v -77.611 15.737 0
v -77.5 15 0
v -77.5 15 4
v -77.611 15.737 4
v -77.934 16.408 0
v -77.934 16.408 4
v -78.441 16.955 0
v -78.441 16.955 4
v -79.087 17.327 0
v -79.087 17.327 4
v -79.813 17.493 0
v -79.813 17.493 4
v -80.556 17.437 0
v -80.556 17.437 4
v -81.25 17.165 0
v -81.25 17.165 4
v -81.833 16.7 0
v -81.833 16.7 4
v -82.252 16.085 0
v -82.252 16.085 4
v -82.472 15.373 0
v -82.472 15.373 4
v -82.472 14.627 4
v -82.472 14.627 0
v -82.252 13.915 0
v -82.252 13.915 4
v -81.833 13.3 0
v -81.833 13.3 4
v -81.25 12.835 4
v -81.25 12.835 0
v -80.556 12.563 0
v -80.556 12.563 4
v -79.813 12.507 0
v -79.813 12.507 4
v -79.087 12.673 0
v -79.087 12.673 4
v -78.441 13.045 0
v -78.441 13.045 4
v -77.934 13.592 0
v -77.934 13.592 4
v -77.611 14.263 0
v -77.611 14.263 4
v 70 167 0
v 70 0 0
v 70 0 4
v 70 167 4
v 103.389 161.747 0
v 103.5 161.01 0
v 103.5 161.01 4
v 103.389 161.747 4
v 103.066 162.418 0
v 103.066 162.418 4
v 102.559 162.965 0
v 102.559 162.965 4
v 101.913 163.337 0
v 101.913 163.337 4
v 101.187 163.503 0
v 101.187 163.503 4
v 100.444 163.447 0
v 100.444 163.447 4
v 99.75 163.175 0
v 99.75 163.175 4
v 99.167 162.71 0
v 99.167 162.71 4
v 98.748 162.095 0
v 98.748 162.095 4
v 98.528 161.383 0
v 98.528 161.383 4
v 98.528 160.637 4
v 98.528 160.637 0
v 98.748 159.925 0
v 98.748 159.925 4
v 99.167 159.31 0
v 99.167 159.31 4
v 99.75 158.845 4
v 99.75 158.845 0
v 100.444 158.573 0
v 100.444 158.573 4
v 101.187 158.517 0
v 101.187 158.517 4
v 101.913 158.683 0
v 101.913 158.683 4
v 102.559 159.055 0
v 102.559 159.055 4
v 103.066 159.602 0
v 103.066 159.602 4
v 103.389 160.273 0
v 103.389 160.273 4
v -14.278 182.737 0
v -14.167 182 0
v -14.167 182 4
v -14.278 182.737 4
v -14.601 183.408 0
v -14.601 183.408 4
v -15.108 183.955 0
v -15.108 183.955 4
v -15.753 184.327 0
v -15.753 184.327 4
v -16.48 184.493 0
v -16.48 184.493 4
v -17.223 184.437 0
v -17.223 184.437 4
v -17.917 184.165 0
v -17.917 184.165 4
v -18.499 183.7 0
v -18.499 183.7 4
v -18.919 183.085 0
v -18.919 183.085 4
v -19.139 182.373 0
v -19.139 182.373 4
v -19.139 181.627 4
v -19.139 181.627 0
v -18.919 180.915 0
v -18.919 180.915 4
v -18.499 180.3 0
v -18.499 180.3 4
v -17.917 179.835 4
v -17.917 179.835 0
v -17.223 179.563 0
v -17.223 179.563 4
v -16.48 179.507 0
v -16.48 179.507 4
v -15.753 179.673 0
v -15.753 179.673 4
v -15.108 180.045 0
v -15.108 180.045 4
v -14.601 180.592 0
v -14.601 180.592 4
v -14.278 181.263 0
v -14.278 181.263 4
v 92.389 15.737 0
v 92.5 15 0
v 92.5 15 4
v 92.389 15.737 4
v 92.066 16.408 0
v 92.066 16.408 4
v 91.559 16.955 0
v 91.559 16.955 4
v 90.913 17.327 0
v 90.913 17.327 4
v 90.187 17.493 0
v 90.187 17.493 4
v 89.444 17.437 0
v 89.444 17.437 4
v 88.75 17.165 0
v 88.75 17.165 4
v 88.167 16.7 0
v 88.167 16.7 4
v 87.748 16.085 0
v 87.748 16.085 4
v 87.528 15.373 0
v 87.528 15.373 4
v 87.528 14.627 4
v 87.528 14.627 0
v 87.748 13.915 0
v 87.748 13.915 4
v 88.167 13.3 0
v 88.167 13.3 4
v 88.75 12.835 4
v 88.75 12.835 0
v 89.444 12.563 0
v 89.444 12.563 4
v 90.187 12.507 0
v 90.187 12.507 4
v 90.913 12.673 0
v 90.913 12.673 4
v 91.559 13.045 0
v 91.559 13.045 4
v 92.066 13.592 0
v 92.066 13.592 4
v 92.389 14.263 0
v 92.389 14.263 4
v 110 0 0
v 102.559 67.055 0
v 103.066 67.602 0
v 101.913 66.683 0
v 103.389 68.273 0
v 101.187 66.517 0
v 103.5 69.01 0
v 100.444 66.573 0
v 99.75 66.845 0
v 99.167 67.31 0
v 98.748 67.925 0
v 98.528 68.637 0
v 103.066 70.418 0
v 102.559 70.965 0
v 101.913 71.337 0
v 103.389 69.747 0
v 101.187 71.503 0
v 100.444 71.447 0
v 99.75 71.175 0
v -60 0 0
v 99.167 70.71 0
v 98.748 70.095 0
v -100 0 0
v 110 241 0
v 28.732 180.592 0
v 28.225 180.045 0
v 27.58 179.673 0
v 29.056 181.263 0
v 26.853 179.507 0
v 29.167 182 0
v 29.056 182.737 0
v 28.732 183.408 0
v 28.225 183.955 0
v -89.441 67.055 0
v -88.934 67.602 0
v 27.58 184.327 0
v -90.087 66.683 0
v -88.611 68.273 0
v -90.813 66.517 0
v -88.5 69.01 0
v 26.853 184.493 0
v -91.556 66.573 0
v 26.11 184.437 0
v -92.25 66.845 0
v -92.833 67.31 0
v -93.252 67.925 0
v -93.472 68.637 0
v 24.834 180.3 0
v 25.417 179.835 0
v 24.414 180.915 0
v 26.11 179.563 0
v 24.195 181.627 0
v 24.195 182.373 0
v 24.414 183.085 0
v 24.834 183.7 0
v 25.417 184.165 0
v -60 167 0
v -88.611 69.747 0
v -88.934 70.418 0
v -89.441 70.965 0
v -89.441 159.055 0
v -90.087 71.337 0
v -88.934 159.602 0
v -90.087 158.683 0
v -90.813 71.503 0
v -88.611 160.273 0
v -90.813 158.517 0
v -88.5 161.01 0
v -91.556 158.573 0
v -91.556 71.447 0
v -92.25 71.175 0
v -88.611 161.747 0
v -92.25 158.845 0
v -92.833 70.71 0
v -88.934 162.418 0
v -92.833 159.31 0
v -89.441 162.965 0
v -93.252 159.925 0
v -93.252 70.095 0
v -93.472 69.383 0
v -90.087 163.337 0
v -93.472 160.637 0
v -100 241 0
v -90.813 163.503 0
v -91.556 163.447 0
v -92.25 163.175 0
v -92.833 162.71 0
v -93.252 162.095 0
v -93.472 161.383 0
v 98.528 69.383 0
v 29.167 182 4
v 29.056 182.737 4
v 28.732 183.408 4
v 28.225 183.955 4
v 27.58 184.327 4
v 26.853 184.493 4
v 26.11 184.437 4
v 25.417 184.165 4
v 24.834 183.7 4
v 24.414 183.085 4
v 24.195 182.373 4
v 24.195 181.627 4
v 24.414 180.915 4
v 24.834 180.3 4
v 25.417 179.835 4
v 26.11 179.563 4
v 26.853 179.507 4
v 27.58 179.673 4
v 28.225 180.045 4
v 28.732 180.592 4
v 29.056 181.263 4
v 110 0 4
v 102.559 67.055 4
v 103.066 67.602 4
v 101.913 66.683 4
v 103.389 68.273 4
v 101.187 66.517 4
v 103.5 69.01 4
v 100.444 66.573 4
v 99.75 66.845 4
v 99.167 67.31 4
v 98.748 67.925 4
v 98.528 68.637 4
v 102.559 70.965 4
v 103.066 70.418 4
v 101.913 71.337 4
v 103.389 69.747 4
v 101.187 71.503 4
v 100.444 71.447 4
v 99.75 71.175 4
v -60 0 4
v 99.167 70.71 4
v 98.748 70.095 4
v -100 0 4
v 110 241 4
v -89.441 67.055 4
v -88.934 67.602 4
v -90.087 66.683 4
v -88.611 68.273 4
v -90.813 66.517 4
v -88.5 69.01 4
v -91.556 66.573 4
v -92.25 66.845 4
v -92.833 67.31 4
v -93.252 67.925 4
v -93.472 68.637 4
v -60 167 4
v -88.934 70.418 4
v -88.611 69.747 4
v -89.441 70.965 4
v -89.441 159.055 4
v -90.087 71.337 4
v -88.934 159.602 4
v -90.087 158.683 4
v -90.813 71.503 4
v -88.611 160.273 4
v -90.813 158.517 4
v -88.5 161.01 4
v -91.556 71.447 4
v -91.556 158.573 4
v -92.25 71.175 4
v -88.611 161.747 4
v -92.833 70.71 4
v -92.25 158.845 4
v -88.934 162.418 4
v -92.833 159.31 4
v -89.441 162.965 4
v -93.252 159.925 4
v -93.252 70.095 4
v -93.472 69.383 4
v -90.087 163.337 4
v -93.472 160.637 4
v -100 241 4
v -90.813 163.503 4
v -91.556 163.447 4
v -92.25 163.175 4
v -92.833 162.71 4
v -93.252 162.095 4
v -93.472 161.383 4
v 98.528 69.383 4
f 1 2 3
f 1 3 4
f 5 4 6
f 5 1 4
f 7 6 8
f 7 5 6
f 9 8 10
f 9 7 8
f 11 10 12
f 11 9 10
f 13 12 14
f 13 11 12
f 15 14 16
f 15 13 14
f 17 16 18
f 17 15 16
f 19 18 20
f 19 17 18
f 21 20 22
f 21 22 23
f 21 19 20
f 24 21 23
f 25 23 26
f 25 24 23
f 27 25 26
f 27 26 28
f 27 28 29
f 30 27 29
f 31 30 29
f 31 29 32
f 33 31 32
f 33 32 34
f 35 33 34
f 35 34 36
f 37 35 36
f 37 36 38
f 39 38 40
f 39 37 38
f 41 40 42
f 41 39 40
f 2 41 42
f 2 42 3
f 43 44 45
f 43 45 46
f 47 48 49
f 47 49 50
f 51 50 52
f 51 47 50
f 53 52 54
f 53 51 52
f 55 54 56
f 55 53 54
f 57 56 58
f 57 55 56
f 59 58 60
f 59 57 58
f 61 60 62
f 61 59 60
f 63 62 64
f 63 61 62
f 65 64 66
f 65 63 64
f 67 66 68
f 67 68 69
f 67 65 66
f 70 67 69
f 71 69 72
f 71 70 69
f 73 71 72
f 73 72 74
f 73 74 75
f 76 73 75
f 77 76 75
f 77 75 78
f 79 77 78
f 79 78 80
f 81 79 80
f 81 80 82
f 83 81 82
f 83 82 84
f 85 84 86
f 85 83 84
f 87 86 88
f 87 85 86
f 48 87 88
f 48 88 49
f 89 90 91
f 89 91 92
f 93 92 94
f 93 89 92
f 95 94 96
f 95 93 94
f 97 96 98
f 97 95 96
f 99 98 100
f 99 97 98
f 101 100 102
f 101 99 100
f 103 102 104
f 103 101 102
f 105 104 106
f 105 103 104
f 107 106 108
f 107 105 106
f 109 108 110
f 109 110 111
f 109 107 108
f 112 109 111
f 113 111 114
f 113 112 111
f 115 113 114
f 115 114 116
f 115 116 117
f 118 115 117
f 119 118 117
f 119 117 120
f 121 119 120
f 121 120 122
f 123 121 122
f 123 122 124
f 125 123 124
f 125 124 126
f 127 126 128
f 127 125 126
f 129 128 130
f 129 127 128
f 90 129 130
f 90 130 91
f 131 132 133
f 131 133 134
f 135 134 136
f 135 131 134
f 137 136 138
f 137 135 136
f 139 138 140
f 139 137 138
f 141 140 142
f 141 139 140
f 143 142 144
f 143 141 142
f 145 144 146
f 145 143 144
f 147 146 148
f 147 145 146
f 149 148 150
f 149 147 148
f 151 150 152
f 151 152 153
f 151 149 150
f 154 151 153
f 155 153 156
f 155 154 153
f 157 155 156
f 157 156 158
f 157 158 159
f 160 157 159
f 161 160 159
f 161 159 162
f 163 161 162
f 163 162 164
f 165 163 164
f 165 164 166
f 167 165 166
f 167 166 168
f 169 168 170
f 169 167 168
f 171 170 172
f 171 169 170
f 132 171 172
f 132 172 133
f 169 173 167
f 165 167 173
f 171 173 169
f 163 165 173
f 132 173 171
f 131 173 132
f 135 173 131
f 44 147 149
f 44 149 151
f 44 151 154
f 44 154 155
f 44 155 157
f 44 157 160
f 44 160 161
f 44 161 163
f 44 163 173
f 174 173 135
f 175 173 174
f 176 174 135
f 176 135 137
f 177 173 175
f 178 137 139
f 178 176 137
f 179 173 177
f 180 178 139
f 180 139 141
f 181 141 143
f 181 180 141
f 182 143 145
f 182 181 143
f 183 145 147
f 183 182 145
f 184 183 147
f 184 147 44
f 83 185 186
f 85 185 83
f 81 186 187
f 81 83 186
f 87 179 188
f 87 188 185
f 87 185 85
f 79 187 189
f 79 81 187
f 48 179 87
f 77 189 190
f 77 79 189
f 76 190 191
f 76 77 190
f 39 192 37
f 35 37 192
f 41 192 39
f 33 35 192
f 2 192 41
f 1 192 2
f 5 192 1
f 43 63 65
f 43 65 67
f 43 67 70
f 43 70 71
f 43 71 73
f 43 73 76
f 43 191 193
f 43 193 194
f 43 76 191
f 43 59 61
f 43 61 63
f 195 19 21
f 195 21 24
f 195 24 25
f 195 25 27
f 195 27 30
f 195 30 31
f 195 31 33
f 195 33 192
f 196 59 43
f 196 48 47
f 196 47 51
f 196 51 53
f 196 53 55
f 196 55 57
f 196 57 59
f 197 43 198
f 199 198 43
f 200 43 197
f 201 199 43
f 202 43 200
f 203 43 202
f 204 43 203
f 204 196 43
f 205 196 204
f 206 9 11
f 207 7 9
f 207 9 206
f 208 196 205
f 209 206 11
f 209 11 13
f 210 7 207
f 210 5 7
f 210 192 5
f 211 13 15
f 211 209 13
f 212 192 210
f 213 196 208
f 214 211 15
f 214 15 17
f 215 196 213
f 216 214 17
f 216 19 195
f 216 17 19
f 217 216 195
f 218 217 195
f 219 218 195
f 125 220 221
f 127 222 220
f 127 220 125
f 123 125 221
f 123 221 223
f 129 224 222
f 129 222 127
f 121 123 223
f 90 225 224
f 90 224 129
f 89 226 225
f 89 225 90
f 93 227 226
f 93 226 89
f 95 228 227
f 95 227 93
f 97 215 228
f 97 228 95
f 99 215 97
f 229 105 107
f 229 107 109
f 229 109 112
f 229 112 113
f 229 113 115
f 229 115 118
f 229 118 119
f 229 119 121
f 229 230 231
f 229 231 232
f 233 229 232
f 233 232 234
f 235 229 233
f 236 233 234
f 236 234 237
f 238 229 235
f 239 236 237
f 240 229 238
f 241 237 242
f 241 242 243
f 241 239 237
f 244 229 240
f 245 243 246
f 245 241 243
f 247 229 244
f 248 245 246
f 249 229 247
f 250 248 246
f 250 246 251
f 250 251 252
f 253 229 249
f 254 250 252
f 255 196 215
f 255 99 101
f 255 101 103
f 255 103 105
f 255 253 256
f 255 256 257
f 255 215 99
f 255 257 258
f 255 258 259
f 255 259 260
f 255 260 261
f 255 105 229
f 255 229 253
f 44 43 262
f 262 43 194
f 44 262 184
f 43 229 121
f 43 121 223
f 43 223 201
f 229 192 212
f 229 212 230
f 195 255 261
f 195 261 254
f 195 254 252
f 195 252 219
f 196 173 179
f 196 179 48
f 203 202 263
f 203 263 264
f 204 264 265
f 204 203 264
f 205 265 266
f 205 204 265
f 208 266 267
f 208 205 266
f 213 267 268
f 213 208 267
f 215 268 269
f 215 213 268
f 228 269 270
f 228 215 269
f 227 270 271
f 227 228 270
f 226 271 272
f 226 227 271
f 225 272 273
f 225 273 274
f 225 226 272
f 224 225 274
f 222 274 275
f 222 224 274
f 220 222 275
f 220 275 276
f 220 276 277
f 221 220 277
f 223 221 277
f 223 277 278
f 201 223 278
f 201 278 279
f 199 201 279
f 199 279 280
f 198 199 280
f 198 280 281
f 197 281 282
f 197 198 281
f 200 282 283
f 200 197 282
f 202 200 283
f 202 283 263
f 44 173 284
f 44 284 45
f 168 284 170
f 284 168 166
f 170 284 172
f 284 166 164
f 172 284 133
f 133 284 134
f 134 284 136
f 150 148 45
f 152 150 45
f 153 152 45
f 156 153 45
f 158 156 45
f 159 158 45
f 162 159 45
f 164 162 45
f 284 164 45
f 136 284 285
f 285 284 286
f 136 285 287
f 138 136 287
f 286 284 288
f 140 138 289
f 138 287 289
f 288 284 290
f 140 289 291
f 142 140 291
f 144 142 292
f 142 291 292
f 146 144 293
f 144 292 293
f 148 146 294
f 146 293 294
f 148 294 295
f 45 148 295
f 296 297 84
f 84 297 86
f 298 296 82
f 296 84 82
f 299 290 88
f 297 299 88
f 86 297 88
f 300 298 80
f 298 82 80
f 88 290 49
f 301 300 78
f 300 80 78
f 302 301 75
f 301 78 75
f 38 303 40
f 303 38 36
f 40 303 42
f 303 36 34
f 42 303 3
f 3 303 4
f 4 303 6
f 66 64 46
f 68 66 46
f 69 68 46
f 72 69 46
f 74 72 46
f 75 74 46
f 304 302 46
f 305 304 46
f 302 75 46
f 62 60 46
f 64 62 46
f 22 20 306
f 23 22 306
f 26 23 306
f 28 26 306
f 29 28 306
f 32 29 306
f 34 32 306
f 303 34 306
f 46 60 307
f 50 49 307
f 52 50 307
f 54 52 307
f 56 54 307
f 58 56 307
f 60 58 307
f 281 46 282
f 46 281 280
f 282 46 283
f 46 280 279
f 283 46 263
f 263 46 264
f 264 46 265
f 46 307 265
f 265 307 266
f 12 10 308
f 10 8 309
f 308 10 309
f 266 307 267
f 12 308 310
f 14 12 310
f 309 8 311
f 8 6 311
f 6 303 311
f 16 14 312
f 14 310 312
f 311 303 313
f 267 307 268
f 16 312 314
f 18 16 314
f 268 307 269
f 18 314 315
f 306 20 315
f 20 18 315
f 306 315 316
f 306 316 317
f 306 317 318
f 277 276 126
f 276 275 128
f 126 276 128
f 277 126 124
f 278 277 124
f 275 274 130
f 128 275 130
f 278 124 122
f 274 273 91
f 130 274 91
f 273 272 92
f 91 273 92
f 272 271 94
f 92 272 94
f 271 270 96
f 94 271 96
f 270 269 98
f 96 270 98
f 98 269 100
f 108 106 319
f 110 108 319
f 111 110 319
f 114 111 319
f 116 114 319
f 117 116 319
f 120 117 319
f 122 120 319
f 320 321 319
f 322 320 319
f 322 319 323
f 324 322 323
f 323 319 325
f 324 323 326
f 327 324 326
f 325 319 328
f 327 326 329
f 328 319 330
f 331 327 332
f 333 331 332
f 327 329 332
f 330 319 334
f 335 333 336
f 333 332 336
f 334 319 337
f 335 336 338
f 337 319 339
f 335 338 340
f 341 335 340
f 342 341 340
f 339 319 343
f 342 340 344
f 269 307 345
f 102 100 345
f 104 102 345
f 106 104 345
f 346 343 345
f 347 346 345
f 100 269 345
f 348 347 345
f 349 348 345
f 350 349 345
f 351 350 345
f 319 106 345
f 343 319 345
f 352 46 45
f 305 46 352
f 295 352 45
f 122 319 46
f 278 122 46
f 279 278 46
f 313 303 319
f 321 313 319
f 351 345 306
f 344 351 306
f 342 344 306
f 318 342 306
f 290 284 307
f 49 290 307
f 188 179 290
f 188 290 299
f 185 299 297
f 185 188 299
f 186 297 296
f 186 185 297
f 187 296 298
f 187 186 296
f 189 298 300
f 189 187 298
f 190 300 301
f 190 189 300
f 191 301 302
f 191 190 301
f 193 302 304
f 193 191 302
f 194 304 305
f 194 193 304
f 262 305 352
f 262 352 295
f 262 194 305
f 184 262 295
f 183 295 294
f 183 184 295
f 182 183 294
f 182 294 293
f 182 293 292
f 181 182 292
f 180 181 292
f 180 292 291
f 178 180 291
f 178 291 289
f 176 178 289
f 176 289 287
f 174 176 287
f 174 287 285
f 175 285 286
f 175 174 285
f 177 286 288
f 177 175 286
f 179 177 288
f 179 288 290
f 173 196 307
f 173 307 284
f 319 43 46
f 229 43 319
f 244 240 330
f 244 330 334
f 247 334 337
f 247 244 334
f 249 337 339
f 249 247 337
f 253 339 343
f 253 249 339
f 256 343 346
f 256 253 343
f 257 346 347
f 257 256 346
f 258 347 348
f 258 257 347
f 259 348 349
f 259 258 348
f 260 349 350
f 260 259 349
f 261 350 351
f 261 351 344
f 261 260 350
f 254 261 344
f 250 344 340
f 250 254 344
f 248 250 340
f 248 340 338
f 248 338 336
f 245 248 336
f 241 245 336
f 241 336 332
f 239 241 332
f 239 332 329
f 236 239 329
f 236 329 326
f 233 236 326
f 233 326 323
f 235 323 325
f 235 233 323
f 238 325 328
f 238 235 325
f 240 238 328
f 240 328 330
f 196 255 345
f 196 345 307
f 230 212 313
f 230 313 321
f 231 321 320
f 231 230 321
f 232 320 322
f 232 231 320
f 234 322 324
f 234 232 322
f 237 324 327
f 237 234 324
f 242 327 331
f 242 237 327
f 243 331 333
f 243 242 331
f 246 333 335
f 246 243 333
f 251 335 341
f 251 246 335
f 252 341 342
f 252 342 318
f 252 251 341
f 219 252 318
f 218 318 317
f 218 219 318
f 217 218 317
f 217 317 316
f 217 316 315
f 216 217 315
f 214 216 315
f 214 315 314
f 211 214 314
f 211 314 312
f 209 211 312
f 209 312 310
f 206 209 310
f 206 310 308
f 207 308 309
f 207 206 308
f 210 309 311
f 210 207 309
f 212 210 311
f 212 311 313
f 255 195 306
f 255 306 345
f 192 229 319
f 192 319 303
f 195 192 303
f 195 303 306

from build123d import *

# Parameters (mm, degrees)
CROQUIS1_R              = 2.5
SALIENTE_EXTRUIR1_DEPTH = 4


with BuildPart() as part:
    # Croquis1 → Saliente-Extruir1 (new body)
    with BuildSketch(Plane.XY):
        Polygon((70, 0), (70, 167), (-60, 167), (-60, 0), (-100, 0), (-100, 241), (110, 241), (110, 0), align=None)
        with Locations((-80, 15)):
            Circle(CROQUIS1_R, mode=Mode.SUBTRACT)
        with Locations((-91, 69.01)):
            Circle(CROQUIS1_R, mode=Mode.SUBTRACT)
        with Locations((-91, 161.01)):
            Circle(CROQUIS1_R, mode=Mode.SUBTRACT)
        with Locations((-16.666666667, 182)):
            Circle(CROQUIS1_R, mode=Mode.SUBTRACT)
        with Locations((26.666666667, 182)):
            Circle(CROQUIS1_R, mode=Mode.SUBTRACT)
        with Locations((101, 161.01)):
            Circle(CROQUIS1_R, mode=Mode.SUBTRACT)
        with Locations((101, 69.01)):
            Circle(CROQUIS1_R, mode=Mode.SUBTRACT)
        with Locations((90, 15)):
            Circle(CROQUIS1_R, mode=Mode.SUBTRACT)
    extrude(amount=SALIENTE_EXTRUIR1_DEPTH)


solid = part.part
